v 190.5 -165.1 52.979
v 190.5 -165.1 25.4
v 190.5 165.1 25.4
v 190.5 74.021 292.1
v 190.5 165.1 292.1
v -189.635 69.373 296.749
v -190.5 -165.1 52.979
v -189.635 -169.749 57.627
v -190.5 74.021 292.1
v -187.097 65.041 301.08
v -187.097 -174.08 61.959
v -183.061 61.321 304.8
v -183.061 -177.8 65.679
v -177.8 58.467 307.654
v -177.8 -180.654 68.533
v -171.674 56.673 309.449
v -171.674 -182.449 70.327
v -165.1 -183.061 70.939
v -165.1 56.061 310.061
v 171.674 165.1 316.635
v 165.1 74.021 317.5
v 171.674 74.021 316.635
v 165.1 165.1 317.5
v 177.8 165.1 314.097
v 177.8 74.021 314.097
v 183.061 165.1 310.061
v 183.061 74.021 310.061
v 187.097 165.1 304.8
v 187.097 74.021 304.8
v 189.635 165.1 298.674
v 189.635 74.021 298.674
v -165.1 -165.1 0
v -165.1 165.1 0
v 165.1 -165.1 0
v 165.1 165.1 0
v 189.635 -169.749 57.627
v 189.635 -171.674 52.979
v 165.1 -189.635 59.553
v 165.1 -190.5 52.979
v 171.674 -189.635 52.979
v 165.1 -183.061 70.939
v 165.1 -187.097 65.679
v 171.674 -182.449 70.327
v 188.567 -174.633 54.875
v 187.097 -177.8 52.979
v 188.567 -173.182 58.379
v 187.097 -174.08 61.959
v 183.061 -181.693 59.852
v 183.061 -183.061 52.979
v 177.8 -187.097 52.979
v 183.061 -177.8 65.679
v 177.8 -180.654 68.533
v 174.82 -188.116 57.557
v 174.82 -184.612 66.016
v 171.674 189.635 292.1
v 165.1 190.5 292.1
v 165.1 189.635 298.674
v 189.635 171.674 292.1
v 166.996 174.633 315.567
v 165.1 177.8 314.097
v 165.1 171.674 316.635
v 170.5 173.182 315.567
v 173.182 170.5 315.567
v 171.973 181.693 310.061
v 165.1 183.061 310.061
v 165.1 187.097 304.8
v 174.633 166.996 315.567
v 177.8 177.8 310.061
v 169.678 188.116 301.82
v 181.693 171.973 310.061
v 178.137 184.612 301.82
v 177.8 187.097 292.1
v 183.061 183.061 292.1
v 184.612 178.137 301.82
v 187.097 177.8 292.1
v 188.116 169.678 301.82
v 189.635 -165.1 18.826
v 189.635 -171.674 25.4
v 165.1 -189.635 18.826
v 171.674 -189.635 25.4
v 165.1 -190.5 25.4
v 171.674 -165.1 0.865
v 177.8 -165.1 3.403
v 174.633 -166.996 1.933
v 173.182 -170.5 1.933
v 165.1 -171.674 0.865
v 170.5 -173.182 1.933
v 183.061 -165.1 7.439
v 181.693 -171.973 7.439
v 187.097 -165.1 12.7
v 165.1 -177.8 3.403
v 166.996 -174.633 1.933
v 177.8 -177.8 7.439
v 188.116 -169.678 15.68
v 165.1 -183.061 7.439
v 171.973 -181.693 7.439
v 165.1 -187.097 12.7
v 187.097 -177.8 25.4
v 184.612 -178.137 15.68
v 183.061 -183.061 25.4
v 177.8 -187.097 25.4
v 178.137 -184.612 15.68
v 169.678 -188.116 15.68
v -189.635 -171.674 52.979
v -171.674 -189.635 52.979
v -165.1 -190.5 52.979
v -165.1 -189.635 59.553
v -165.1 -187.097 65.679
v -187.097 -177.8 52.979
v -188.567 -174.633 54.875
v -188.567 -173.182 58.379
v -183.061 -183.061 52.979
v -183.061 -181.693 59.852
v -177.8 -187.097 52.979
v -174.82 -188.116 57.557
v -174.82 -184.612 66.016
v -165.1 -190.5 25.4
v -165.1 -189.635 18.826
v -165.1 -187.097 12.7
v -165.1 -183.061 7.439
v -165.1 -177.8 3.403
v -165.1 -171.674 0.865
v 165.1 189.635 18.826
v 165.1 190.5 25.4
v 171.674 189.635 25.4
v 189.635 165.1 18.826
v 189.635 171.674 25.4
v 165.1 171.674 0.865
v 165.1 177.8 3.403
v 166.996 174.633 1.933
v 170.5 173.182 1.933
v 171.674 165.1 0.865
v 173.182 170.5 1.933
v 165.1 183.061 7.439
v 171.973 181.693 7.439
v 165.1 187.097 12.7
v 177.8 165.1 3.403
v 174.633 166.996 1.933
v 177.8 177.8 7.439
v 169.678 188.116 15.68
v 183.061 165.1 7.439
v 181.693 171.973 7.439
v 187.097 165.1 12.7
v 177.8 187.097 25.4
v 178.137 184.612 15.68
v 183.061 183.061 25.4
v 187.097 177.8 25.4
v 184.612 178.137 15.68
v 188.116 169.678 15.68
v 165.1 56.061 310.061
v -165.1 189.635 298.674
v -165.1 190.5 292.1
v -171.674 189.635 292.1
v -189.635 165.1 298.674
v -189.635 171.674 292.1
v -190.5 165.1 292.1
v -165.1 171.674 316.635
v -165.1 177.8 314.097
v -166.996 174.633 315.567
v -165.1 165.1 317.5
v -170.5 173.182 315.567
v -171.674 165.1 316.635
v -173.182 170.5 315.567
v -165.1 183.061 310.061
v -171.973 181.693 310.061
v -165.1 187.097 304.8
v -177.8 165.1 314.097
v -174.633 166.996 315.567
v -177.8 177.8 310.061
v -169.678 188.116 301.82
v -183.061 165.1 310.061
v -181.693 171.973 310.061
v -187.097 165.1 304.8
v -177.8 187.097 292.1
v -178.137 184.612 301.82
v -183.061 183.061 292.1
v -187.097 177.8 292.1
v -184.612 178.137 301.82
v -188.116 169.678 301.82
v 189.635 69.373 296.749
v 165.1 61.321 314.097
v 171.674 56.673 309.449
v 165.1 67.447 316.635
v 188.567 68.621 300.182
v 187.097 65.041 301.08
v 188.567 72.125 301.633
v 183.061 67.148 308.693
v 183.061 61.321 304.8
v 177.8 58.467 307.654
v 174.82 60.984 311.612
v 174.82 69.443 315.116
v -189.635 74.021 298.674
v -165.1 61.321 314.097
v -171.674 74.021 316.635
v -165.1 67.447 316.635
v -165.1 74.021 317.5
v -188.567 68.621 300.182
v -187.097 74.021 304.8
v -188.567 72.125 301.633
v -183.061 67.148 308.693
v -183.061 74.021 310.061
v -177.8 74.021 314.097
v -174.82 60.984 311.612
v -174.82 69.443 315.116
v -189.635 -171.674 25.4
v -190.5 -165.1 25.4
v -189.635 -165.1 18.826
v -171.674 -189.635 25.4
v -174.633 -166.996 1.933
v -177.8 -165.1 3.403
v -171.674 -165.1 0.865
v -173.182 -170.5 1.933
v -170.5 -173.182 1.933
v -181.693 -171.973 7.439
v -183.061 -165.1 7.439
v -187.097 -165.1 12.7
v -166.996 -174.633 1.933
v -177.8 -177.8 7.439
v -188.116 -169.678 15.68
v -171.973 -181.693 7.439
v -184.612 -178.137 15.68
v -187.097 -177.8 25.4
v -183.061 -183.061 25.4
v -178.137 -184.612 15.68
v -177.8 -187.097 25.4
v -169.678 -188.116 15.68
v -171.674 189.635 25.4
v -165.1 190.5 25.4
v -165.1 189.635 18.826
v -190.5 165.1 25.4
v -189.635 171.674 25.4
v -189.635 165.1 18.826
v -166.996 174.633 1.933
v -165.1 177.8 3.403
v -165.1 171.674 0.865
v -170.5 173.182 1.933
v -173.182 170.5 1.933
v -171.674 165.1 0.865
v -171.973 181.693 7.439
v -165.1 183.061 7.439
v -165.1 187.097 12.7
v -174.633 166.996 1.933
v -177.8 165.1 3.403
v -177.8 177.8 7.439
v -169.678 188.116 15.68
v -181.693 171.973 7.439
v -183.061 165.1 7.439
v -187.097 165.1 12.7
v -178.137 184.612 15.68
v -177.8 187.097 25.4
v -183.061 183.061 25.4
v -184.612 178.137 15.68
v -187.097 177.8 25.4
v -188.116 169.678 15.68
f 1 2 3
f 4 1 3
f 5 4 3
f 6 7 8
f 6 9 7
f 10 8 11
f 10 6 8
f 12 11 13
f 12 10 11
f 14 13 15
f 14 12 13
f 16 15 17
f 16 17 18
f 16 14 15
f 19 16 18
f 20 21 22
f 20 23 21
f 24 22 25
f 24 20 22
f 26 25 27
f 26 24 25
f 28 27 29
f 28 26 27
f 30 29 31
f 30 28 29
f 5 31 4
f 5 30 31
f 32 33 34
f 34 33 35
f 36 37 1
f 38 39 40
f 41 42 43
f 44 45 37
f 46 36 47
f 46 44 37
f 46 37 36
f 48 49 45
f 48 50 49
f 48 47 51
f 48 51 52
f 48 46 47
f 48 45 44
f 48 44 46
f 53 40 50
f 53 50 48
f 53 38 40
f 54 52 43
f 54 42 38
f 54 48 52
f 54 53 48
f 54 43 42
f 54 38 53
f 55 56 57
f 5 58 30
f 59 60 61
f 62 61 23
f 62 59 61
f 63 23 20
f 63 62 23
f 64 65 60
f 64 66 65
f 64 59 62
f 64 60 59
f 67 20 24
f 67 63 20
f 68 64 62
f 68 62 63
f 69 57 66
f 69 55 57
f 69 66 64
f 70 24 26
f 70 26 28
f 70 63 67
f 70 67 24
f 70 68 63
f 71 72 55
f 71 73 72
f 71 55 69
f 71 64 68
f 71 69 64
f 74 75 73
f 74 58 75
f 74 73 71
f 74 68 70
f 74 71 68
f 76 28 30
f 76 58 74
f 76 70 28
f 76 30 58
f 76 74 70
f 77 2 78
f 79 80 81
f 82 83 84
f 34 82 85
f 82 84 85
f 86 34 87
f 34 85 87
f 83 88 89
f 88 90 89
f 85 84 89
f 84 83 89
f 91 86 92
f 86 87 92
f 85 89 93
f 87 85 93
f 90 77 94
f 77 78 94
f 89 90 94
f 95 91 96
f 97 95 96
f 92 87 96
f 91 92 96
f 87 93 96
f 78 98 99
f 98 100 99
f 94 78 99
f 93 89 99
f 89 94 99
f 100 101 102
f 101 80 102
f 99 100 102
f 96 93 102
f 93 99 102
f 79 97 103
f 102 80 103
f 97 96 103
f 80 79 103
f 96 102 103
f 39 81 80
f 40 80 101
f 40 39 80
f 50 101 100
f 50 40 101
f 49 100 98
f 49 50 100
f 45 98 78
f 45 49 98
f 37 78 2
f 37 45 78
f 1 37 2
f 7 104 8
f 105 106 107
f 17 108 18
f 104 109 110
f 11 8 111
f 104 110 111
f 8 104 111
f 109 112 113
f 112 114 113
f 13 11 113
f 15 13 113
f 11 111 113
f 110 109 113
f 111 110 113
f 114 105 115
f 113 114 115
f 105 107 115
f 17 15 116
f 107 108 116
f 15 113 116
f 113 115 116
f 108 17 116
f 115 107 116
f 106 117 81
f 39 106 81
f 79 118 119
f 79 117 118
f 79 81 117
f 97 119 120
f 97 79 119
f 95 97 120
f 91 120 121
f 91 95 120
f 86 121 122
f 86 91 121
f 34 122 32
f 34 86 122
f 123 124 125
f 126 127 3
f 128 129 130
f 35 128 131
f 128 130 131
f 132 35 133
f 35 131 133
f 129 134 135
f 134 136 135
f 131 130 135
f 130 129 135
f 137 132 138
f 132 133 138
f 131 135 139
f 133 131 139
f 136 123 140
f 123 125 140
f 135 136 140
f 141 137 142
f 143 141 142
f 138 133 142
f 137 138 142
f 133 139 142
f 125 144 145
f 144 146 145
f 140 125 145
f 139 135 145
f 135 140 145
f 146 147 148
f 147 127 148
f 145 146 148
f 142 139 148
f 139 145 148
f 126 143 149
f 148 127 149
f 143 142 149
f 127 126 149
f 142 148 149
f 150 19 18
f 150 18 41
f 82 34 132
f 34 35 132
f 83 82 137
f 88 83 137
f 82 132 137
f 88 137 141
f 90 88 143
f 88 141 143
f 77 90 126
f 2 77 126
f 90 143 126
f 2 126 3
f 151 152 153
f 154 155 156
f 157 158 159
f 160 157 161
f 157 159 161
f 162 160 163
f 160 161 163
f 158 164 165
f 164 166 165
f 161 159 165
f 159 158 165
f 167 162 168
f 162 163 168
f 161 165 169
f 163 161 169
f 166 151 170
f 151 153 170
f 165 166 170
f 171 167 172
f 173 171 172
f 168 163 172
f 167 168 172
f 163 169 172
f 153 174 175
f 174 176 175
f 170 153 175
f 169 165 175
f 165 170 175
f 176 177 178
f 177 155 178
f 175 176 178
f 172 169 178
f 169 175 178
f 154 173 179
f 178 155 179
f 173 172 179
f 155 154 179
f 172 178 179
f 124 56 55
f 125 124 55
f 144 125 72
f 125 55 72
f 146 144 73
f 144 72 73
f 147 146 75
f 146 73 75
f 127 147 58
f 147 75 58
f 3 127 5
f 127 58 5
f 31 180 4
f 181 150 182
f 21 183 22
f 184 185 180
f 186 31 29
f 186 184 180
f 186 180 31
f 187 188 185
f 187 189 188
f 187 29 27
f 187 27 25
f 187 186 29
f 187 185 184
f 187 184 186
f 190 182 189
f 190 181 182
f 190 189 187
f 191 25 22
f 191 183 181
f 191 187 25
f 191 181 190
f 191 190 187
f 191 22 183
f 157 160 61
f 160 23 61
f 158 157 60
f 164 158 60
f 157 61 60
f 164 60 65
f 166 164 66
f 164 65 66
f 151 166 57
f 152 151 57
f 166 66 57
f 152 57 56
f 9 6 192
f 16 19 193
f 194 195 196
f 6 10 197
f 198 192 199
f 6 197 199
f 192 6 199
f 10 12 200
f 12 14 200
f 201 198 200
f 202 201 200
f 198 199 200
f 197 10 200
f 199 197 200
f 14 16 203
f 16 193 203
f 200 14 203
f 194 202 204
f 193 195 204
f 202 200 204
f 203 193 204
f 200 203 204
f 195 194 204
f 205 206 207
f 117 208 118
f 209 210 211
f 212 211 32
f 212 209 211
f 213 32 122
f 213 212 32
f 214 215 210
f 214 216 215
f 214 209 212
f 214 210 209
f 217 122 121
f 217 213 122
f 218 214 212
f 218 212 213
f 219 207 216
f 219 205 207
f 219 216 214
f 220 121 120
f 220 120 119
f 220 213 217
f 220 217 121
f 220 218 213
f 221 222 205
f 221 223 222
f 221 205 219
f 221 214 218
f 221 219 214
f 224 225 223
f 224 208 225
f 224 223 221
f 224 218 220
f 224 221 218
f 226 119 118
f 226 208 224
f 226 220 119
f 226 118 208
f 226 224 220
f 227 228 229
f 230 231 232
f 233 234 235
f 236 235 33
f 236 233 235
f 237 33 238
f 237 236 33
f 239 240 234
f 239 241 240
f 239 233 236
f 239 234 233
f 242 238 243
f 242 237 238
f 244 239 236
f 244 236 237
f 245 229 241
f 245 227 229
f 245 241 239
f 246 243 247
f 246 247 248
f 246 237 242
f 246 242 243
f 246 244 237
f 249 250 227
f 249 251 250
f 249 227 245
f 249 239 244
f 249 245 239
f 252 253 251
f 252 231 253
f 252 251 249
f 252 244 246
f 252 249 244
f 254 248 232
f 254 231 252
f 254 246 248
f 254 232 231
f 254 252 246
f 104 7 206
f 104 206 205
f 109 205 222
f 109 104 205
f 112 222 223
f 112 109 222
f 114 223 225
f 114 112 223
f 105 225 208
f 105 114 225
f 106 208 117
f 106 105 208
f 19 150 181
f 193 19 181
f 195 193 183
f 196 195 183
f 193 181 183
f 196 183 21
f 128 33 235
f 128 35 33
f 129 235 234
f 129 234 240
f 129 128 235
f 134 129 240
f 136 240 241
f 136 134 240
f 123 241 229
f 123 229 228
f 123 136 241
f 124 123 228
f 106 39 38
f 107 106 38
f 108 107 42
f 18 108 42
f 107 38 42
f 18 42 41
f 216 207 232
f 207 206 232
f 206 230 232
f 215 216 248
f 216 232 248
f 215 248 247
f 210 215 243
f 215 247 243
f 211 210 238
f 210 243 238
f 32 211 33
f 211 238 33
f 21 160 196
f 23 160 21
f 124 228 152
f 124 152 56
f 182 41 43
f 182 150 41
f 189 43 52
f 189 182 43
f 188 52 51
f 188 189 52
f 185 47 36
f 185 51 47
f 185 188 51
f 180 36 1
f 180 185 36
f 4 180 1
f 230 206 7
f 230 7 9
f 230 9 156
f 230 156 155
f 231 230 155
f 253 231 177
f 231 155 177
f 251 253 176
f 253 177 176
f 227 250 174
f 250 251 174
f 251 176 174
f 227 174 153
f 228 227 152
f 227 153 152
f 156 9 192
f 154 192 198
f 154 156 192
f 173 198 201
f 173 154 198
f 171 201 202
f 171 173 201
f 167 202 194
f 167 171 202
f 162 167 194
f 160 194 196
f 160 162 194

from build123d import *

# Parameters (mm, degrees)
F0_W     = 381
F0_H     = 381
F1_DEPTH = 317.5
F2_SIZE  = 254
F3_R     = 25.4


with BuildPart() as f1:
    # F0 (on Top) → F1 (new body)
    with BuildSketch(Plane.XY):
        Rectangle(F0_W, F0_H)
    extrude(amount=F1_DEPTH)

    # F2
    f2_edges = [f1.edges().sort_by_distance(p)[0] for p in [
        (0, -190.5, 317.5),
    ]]
    chamfer(f2_edges, length=F2_SIZE)

    # F3
    f3_edges = [f1.edges().sort_by_distance(p)[0] for p in [
        (190.5, 190.5, 158.75),
        (-190.5, 190.5, 158.75),
        (0, 190.5, 0),
        (0, 190.5, 317.5),
        (-190.5, -190.5, 31.75),
        (-190.5, -63.5, 190.5),
        (-190.5, 0, 0),
        (-190.5, 127, 317.5),
        (190.5, 127, 317.5),
        (0, 63.5, 317.5),
        (190.5, -190.5, 31.75),
        (190.5, -63.5, 190.5),
        (190.5, 0, 0),
        (0, -190.5, 0),
        (0, -190.5, 63.5),
    ]]
    fillet(f3_edges, radius=F3_R)


solid = f1.part
